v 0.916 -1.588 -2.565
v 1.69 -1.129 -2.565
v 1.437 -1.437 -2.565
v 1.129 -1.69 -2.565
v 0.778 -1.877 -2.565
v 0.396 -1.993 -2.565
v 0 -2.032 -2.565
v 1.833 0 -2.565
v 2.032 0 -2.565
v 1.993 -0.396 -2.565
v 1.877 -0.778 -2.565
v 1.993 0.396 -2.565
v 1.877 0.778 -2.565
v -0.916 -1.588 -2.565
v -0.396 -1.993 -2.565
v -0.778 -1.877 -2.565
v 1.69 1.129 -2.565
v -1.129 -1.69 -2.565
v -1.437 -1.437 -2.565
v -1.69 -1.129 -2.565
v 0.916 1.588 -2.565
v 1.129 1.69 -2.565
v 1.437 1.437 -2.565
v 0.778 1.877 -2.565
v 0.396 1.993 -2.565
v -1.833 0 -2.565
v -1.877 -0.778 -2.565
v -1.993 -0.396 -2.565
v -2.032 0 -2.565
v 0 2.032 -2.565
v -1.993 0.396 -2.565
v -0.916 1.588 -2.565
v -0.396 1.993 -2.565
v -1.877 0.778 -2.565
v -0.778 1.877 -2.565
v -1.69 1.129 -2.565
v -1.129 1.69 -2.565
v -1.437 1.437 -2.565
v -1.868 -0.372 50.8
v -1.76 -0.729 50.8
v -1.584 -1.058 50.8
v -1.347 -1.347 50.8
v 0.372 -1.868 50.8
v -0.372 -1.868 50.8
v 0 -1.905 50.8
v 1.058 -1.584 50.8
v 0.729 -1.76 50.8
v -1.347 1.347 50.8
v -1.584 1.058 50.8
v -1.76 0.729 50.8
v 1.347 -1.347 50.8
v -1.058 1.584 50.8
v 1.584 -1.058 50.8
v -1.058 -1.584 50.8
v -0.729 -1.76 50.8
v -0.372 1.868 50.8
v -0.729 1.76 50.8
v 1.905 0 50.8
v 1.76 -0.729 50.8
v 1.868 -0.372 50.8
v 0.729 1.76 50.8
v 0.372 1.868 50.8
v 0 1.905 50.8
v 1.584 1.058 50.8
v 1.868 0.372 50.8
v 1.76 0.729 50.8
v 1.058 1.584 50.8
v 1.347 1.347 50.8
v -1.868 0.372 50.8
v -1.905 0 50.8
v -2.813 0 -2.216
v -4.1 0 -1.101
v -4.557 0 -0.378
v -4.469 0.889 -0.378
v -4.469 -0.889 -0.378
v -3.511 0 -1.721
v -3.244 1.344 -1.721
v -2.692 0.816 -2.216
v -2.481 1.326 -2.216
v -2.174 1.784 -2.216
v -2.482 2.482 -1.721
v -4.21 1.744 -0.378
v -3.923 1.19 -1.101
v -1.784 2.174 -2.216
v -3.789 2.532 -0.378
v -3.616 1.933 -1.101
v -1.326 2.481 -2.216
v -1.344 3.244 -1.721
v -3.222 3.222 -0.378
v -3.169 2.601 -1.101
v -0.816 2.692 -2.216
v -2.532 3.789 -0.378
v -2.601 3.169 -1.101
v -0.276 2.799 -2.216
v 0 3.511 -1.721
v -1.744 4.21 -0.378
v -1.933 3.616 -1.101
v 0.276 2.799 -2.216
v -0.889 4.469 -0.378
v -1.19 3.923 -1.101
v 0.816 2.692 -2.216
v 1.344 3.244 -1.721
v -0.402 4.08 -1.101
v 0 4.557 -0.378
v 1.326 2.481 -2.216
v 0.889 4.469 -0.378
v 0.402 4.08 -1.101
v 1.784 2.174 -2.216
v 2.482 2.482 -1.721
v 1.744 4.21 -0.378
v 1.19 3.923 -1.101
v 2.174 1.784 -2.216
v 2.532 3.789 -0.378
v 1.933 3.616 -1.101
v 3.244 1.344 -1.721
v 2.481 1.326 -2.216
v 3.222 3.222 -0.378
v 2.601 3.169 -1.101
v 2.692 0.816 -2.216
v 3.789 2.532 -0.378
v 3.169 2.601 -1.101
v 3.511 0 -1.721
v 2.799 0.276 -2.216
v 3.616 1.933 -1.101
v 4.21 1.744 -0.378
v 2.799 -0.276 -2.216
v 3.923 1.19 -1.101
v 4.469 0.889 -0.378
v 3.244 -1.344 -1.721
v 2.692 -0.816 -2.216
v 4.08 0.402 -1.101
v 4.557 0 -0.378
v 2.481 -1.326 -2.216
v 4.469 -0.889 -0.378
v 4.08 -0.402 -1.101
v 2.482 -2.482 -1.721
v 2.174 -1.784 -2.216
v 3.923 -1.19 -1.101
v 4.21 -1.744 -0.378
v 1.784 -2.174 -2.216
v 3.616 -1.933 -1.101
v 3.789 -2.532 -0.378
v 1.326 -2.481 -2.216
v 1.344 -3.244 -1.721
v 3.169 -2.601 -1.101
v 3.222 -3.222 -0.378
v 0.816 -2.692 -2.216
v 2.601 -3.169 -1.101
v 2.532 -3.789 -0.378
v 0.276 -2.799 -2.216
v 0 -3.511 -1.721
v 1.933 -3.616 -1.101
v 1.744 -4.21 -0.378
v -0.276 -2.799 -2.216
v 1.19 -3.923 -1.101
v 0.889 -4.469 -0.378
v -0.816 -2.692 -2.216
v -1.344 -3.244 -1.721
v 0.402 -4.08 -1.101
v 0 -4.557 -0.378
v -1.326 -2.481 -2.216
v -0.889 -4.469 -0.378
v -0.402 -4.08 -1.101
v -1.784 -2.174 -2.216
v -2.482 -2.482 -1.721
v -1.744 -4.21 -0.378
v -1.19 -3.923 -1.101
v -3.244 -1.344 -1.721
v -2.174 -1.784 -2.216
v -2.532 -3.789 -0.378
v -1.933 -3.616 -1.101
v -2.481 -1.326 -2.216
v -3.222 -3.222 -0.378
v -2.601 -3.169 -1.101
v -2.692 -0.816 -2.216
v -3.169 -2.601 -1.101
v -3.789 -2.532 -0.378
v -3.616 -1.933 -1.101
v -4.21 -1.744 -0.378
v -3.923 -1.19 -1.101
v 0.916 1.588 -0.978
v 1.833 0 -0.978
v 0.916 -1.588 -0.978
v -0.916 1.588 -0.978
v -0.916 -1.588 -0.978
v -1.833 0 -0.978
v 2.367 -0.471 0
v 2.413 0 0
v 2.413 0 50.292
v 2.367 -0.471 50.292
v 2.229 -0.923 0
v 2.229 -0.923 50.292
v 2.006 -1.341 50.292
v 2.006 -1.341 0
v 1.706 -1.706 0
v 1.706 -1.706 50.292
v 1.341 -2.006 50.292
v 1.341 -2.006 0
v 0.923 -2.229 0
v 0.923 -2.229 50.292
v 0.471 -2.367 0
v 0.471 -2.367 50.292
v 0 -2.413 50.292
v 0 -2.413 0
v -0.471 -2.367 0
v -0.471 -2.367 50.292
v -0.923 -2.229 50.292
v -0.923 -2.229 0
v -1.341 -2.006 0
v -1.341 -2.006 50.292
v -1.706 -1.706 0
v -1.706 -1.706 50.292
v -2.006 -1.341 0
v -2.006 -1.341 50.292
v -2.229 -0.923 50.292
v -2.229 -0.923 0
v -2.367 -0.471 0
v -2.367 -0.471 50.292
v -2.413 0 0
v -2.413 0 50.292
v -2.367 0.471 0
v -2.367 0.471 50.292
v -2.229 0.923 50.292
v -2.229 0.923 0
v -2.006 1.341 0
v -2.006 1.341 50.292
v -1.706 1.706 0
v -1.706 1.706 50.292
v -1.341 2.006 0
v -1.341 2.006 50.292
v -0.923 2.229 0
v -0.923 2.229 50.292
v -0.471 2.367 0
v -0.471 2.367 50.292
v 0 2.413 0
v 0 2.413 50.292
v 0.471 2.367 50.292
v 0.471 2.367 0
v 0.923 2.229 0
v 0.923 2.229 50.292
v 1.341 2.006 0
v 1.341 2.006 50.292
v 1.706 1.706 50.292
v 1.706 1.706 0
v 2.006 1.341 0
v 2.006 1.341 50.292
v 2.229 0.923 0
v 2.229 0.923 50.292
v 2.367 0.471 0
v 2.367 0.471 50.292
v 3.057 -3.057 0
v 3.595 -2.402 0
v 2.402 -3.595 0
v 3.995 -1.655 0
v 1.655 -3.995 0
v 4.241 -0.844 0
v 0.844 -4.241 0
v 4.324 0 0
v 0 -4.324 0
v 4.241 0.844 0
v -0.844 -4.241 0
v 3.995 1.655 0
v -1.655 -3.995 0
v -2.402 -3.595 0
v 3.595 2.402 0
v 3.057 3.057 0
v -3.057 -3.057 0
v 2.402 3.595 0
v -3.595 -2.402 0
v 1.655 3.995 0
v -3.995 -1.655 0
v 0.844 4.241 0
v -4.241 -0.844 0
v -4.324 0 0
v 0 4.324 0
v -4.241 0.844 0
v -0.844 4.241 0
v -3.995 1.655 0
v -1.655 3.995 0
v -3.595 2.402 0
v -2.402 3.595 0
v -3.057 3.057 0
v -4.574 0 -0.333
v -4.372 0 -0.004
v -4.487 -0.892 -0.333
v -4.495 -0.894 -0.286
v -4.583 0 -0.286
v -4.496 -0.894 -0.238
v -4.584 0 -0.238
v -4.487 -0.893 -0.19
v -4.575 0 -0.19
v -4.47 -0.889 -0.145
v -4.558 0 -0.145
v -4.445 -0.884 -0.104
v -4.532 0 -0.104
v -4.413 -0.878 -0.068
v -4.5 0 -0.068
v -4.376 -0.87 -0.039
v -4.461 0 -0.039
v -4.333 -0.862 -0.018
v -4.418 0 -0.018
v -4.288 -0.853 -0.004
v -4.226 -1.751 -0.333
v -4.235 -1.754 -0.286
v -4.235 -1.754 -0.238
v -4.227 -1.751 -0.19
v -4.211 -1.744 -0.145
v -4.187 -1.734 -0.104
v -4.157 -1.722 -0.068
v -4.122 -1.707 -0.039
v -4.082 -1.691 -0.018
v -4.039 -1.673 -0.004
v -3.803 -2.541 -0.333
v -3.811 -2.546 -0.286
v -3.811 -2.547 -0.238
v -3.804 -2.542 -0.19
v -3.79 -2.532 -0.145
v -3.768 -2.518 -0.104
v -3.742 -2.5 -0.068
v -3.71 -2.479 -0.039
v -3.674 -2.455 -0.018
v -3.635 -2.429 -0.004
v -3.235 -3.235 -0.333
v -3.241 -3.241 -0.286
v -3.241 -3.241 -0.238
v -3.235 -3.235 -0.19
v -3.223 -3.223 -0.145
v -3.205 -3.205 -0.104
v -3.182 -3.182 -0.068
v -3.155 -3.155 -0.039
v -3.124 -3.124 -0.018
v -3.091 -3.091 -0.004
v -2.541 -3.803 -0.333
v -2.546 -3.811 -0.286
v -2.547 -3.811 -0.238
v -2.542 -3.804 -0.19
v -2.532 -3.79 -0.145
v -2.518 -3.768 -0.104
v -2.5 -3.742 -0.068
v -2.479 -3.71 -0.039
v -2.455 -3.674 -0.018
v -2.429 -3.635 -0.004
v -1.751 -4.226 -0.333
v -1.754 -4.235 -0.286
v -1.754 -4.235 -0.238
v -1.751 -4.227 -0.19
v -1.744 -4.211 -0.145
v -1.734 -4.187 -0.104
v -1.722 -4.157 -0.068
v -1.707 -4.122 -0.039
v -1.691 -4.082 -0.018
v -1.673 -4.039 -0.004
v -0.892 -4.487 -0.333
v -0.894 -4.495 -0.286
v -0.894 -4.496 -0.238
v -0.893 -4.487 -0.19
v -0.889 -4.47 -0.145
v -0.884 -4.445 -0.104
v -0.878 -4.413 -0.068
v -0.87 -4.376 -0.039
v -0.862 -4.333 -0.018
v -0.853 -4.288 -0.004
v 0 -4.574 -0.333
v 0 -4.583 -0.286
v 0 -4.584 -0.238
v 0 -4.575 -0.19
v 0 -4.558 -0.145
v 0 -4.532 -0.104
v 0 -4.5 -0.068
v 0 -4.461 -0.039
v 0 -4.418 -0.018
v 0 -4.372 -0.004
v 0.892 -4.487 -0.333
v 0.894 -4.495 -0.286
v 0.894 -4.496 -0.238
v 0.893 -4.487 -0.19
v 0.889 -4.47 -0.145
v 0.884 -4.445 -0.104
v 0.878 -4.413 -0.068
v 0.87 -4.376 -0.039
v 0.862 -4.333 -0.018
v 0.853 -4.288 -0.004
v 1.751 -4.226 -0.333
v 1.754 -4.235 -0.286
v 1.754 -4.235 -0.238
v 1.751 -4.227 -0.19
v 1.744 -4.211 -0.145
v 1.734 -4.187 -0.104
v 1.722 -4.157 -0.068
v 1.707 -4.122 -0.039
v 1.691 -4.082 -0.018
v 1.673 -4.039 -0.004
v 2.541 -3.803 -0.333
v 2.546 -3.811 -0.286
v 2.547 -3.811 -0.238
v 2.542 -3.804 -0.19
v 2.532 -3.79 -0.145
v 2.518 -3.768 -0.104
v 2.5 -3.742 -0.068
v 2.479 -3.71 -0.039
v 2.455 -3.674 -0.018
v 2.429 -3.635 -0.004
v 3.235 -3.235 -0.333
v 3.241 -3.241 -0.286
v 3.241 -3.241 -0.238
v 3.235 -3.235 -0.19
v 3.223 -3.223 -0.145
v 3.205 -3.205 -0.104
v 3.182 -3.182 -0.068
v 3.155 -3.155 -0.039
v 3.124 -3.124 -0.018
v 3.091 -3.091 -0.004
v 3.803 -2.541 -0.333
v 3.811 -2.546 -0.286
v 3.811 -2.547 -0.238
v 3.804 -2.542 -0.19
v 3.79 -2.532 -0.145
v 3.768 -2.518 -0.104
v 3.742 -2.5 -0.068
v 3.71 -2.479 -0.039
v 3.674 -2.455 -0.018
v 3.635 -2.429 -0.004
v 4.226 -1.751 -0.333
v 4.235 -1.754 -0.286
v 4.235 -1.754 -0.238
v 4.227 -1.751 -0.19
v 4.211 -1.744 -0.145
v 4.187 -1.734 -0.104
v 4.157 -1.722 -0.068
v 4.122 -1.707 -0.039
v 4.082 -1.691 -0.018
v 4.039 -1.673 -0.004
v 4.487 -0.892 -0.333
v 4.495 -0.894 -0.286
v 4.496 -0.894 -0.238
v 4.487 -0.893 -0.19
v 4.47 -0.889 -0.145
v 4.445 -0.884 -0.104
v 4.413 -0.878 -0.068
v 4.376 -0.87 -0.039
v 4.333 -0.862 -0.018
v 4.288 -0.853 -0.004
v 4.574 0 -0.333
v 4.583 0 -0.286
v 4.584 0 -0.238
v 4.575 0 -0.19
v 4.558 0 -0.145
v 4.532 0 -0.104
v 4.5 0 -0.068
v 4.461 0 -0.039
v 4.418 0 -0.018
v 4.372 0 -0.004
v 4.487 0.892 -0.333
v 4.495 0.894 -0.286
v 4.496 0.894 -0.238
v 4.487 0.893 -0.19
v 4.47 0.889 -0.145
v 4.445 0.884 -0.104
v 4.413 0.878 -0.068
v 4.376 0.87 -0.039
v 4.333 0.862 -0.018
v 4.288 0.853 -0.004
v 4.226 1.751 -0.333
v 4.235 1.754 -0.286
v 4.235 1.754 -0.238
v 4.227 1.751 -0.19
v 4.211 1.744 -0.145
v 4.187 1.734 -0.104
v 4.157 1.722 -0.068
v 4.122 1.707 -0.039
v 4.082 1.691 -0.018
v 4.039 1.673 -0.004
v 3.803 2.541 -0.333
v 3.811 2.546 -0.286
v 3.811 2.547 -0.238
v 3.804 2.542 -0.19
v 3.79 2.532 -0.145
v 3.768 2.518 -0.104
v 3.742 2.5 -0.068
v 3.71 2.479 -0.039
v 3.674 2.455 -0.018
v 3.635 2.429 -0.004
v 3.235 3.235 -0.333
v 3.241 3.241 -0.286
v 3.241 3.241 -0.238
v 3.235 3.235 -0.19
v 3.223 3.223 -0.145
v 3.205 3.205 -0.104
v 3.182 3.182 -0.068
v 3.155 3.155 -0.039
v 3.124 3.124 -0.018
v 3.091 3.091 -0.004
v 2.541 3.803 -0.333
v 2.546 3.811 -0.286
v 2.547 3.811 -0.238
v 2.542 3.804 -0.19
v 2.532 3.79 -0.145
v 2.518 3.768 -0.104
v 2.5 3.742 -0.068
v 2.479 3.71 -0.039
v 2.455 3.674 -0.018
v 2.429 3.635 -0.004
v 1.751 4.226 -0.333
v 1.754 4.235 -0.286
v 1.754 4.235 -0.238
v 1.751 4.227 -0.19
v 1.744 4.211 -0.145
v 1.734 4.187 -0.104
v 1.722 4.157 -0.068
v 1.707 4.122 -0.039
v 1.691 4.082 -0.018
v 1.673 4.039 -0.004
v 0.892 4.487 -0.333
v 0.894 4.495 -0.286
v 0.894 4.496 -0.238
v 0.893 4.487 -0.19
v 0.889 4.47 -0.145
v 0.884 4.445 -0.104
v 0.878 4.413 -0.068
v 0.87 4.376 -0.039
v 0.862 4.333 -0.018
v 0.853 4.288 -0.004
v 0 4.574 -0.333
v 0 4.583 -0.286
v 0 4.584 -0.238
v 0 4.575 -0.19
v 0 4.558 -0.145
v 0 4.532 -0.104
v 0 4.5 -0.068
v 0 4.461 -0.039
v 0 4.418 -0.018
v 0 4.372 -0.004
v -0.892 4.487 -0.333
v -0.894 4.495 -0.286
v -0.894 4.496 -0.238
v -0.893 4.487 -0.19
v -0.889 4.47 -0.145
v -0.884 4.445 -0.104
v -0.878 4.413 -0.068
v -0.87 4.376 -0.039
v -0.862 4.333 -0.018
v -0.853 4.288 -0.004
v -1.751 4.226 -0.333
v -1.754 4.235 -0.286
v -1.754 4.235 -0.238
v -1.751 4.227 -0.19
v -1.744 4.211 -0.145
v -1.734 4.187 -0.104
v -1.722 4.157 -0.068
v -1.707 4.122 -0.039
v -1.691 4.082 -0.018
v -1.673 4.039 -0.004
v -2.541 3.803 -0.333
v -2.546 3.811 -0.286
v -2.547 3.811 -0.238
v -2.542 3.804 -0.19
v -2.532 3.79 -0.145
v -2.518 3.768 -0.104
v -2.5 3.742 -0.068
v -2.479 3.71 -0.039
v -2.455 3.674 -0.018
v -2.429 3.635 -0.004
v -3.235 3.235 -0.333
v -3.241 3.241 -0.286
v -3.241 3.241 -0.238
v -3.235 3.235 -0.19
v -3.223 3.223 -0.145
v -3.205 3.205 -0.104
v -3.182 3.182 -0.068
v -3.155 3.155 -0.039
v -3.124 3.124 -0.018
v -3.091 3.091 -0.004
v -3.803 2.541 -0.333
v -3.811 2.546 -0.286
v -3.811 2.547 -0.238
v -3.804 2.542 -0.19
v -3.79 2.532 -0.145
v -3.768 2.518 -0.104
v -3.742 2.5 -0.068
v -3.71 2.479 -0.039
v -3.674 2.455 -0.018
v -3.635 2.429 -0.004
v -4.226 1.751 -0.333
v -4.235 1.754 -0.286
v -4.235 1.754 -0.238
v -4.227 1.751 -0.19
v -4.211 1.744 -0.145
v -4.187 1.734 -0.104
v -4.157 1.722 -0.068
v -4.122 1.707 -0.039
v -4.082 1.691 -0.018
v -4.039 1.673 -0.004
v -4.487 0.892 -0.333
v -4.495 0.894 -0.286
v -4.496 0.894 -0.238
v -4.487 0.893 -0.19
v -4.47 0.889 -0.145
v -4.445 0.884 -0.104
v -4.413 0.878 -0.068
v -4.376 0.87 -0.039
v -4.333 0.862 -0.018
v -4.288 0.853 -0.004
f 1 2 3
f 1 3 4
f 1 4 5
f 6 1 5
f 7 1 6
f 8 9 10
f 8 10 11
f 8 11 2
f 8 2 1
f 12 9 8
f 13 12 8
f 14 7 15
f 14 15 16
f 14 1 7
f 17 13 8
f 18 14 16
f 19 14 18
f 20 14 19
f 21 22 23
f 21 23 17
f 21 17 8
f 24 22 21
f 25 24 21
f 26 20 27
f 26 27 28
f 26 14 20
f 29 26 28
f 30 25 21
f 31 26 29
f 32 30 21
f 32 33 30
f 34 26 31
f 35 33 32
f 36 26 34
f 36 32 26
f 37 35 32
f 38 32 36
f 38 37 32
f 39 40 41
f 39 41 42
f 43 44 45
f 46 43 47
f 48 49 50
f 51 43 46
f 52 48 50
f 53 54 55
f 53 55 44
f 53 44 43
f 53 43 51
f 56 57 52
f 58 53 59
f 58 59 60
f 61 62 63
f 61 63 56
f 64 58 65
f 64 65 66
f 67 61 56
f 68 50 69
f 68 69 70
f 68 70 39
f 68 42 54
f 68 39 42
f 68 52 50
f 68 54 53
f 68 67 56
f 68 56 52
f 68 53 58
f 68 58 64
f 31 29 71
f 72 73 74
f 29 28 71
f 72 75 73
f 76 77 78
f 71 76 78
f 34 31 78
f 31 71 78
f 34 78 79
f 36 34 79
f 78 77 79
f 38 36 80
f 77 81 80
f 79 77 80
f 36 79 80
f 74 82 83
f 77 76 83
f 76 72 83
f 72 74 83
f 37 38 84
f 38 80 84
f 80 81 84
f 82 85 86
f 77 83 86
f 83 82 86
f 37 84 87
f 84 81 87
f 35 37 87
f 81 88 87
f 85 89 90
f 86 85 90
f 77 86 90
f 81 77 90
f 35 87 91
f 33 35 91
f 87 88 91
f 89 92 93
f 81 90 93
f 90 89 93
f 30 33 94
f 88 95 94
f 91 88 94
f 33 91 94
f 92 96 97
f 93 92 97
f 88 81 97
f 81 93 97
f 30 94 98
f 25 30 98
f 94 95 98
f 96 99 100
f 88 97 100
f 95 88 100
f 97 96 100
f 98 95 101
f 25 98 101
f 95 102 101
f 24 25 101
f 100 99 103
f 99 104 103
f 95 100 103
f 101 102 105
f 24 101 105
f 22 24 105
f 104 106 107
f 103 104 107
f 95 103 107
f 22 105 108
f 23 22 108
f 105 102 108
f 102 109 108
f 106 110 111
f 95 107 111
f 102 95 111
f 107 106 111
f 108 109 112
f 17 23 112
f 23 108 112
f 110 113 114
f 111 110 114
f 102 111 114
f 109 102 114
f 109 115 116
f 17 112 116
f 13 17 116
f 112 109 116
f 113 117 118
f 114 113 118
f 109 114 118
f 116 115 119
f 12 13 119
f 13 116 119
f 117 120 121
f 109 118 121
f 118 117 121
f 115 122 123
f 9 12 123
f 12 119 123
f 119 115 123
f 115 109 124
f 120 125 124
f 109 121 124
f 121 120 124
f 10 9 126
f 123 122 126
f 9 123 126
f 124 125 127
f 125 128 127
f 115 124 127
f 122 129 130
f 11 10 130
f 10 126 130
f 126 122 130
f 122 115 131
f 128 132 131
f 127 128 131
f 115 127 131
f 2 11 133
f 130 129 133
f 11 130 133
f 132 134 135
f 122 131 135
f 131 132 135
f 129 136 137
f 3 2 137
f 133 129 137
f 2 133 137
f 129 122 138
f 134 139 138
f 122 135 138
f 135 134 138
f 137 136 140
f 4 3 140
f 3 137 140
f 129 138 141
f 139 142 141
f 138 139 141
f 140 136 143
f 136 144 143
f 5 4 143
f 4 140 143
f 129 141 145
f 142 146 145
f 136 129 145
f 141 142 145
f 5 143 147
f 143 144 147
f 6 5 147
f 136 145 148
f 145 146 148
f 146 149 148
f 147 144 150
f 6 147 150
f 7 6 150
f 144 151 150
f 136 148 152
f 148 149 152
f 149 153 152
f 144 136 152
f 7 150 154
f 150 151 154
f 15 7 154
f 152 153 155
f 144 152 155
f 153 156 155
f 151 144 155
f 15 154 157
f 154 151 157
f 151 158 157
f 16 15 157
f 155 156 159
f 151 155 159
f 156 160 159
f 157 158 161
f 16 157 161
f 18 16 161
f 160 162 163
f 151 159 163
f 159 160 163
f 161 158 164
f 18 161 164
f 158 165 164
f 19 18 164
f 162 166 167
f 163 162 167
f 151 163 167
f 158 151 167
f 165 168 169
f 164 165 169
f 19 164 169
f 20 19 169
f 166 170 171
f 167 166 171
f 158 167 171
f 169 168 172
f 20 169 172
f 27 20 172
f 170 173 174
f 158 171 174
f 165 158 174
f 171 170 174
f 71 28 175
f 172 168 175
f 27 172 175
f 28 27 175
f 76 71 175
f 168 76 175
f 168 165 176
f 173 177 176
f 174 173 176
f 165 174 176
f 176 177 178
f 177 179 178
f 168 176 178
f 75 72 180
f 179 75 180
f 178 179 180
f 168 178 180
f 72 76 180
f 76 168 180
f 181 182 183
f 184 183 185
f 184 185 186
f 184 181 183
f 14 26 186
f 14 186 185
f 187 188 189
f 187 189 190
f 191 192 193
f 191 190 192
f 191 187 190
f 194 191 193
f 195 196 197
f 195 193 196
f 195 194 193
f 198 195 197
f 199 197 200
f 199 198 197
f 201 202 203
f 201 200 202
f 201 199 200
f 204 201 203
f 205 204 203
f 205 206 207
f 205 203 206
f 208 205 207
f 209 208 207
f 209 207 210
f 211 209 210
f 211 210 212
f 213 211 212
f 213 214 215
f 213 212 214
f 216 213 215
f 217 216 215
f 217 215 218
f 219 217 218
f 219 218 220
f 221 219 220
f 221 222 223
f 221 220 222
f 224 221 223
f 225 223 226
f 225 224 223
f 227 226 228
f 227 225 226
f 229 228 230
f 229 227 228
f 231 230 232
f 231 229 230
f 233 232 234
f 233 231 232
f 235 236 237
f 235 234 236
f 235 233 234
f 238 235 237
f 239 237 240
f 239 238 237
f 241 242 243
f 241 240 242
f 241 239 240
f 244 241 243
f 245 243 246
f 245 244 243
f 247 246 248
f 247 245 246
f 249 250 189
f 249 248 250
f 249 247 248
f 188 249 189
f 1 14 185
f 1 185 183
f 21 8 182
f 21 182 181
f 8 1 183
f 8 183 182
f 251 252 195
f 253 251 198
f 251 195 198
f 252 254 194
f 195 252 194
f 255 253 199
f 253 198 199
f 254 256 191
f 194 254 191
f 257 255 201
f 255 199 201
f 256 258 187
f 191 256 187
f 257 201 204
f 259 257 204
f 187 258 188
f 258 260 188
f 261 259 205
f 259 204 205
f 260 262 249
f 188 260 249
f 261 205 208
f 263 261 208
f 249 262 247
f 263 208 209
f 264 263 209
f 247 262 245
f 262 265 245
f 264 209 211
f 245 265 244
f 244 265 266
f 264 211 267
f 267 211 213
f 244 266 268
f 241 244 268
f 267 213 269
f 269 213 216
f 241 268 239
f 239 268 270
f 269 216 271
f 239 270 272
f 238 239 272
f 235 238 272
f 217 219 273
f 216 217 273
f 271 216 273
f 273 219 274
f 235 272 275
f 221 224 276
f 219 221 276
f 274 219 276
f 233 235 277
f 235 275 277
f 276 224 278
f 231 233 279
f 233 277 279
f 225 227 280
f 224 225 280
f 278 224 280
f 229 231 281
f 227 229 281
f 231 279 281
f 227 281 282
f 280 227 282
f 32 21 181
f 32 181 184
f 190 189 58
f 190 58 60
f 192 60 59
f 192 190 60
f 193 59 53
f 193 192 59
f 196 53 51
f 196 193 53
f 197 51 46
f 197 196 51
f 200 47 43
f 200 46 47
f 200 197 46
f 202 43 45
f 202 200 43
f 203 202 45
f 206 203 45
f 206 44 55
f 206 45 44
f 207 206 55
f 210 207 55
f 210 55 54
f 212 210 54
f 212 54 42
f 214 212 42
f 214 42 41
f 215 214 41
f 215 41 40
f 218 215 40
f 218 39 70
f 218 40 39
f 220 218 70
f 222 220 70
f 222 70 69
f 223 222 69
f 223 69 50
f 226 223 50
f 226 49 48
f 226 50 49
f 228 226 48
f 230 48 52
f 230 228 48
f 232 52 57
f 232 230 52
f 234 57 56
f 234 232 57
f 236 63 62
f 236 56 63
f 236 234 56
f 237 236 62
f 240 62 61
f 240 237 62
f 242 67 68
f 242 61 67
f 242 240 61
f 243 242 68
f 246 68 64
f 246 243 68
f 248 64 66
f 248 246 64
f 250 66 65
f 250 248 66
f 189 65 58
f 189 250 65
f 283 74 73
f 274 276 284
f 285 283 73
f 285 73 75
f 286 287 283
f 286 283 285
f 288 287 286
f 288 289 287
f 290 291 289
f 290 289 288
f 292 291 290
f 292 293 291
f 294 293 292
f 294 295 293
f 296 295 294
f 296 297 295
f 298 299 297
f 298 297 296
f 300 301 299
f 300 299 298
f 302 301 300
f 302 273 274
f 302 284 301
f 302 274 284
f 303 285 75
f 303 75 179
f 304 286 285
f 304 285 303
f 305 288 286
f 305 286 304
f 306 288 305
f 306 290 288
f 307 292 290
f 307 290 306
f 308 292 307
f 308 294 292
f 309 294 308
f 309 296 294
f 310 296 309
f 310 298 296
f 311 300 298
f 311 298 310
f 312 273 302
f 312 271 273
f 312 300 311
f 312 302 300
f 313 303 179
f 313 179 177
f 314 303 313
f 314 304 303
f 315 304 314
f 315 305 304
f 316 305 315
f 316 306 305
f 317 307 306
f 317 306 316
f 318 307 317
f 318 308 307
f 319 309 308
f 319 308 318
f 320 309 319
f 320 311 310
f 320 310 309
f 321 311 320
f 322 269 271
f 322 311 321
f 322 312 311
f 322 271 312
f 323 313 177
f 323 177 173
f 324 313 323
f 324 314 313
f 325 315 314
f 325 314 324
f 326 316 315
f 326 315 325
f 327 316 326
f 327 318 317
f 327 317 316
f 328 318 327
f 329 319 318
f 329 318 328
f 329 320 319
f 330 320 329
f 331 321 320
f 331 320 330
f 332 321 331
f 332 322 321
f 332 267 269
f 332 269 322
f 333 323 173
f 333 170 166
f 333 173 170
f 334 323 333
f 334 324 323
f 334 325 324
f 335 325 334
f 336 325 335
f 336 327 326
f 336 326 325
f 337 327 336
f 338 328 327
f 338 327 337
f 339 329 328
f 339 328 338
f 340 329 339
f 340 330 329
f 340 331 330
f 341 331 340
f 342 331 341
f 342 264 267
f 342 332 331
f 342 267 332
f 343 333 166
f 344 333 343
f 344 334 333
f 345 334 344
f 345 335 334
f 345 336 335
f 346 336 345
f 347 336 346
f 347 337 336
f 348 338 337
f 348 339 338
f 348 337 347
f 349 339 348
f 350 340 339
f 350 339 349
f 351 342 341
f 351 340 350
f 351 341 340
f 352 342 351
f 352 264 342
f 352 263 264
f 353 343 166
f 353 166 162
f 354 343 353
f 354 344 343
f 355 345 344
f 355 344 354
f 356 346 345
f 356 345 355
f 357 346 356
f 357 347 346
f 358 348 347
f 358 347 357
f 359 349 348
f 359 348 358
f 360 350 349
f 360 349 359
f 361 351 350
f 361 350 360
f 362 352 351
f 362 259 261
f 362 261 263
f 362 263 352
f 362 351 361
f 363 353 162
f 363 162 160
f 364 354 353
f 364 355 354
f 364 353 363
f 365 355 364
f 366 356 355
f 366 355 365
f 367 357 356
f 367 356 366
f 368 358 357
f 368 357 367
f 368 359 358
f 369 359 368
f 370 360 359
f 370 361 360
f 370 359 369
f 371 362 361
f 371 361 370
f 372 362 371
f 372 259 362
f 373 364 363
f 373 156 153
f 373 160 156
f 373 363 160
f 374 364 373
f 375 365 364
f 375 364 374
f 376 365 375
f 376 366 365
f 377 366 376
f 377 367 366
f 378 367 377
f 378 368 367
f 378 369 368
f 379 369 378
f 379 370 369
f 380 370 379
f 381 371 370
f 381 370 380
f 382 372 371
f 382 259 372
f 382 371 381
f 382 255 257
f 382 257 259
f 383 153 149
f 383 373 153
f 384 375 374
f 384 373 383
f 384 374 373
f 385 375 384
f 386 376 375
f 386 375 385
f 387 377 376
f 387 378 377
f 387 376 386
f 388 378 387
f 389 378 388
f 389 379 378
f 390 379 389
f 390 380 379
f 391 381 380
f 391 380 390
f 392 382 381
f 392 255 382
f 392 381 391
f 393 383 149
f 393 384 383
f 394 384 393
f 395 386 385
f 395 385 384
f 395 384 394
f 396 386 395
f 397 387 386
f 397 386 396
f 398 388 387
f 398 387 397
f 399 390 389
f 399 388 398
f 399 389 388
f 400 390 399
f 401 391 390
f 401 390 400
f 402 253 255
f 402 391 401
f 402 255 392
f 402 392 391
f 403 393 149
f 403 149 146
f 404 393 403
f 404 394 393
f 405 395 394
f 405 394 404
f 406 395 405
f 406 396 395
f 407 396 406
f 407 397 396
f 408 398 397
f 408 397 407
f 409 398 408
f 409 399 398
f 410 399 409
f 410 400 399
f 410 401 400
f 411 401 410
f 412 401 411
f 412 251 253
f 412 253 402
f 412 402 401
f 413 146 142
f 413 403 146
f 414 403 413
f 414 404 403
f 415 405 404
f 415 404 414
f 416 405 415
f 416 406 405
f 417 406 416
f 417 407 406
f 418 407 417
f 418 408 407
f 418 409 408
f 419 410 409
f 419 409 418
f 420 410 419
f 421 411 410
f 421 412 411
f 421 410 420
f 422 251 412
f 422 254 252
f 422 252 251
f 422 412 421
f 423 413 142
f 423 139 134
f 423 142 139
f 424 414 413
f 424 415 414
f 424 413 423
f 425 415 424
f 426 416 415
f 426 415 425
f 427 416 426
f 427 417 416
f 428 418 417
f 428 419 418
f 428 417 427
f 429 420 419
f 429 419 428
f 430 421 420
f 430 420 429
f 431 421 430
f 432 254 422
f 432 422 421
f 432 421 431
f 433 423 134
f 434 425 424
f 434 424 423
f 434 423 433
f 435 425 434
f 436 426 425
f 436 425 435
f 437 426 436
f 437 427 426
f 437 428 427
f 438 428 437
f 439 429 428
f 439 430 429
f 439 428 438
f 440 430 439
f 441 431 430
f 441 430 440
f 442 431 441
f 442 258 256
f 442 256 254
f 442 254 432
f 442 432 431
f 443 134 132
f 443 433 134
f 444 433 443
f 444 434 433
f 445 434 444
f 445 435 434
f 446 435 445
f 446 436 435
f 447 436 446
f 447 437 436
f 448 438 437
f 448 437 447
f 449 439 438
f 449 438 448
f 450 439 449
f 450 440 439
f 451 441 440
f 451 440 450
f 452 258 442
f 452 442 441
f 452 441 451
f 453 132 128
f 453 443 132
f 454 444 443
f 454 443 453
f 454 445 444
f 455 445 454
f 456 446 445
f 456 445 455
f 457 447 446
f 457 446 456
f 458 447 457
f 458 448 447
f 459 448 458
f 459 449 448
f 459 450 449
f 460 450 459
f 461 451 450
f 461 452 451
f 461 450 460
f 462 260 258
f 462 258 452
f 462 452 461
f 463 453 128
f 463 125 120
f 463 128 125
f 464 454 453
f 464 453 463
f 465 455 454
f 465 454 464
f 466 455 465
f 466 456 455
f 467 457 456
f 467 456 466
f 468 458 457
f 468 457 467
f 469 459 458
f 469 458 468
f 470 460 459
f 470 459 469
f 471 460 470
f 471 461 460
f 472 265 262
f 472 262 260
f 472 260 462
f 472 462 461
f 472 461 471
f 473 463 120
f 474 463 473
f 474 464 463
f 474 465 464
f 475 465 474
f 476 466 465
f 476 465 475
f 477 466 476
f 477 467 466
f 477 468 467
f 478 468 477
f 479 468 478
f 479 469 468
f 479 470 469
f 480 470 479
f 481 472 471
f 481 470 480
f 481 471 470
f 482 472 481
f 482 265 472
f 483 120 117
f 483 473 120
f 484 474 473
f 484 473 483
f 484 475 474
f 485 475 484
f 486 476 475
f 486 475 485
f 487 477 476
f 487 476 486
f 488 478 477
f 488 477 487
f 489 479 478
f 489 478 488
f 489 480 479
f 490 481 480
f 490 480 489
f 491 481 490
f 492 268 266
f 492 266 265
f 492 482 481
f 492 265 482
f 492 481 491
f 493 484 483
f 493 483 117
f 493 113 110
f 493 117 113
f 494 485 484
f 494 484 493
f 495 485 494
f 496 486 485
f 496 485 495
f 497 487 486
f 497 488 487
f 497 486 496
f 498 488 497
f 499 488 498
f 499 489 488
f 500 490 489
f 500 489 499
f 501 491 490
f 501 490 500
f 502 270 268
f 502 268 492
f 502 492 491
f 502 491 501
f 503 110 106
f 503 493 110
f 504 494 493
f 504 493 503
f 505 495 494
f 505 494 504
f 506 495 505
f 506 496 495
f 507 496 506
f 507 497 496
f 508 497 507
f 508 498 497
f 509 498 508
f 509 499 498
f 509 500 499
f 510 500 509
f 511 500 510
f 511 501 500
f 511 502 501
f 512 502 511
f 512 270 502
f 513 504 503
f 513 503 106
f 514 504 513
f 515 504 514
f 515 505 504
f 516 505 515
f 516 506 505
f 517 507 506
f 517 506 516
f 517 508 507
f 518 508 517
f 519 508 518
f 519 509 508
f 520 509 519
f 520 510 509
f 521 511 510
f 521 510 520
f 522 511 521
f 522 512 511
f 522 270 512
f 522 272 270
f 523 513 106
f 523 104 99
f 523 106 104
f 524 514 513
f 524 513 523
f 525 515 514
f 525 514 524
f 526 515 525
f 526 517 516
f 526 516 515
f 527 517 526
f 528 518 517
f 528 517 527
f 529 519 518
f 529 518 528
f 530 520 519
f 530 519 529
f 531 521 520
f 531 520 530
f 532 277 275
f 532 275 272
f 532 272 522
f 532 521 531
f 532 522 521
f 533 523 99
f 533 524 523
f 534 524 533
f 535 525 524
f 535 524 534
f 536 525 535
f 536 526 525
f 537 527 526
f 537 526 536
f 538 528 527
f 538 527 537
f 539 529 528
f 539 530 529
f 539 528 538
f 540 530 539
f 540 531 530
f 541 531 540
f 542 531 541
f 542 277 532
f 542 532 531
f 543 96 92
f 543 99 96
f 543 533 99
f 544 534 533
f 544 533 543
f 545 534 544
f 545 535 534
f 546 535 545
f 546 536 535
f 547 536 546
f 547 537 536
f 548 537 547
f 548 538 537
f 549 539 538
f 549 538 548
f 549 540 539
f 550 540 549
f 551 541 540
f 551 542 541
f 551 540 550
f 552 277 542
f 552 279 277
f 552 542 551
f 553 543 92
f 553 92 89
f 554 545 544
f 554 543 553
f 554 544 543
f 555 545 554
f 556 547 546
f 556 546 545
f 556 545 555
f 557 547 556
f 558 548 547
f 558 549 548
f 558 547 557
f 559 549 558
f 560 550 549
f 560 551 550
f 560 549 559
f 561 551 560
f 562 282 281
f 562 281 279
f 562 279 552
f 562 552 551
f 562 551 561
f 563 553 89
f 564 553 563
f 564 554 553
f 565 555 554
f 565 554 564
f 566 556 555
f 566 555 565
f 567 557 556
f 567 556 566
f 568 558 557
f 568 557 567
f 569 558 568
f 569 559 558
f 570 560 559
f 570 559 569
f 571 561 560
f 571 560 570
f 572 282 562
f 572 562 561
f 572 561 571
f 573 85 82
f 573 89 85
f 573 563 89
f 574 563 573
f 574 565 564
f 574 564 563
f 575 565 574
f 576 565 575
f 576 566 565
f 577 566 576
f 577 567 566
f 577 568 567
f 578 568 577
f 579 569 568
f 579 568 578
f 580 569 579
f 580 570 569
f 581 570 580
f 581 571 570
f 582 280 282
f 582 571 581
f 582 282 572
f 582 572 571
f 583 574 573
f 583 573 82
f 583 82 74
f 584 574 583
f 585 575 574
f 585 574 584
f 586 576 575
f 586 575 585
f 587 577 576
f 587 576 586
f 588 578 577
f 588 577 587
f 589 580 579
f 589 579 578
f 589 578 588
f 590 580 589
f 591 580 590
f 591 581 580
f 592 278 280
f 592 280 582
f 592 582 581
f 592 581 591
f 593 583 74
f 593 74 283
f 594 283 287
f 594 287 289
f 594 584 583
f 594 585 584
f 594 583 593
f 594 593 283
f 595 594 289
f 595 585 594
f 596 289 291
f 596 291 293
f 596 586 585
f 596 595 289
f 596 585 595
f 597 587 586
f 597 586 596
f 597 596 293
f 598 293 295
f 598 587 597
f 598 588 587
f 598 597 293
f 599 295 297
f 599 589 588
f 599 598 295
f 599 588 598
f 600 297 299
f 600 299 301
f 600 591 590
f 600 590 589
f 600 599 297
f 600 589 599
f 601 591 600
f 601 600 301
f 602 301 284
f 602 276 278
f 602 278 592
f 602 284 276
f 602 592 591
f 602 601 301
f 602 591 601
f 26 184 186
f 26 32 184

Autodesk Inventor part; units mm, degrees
ref_plane "YZ Plane" through (0, 0, 0) normal (1, 0, 0) x (0, 1, 0)
ref_plane "XZ Plane" through (0, 0, 0) normal (0, 1, 0) x (-1, 0, 0)
ref_plane "XY Plane" through (0, 0, 0) normal (0, 0, 1) x (1, 0, 0)
sketch "Sketch1" plane through (0, 0, 0) normal (0, 0, 1) x (1, 0, 0)
  circle A0 centre (0, 0) radius 2.413
  dimension "d0" = 4.826
extrude "Extrusion1" add sketch "Sketch1" along normal blind 50.8
sketch "Sketch2" plane through (0, 0, 0) normal (0, 1, 0) x (-1, 0, 0)
  line L0 (0, 0) -> (0, -2.5654)
  line L1 (0, 0) -> (4.3239, 0)
  line L2 (0, -2.5654) -> (2.032, -2.5654)
  line L3 (4.3239, 0) -> (4.3239, 3.8864) construction
  arc A0 (4.5568, -0.3781) -> (4.3239, 0) centre (4.3239, -0.2608) ccw
  arc A1 (2.032, -2.5654) -> (4.5568, -0.3781) centre (0.6382, 1.5944) ccw
  line L4 (4.5847, 0.6553) -> (4.5847, -0.2608) construction
  dimension "d3" = 2.5654
  dimension "d6" = 2.032
  dimension "d12" = 4.5847
revolve "Revolution1" add sketch "Sketch2" angle 360 about axis through (0, 0, 0) along (0, 0, -1)
sketch "Sketch3" plane through (0, 0, -2.5654) normal (0, 0, -1) x (-1, 0, 0)
  circle A0 centre (0, 0) radius 2.032 projected
  line L0 (-0.9165, 1.5875) -> (0.9165, 1.5875)
  line L1 (0.9165, 1.5875) -> (1.8331, 0)
  line L2 (1.8331, 0) -> (0.9165, -1.5875)
  line L3 (0.9165, -1.5875) -> (-0.9165, -1.5875)
  line L4 (-0.9165, -1.5875) -> (-1.8331, 0)
  line L5 (-1.8331, 0) -> (-0.9165, 1.5875)
  dimension "d8" = 3.175
extrude "Extrusion2" cut sketch "Sketch3" against normal blind 1.5875 contours L0 L1 L2 L3 L4 L5
chamfer "Chamfer1" distance 0.508 angle 45 1 edges at (-2.413, 0, 50.8)
thread "Thread2" size "10-24 UNC" class "2A" standard "ANSI Unified Screw Threads" length 22.225
properties part number "10-32 x625 button head" material "Steel"
